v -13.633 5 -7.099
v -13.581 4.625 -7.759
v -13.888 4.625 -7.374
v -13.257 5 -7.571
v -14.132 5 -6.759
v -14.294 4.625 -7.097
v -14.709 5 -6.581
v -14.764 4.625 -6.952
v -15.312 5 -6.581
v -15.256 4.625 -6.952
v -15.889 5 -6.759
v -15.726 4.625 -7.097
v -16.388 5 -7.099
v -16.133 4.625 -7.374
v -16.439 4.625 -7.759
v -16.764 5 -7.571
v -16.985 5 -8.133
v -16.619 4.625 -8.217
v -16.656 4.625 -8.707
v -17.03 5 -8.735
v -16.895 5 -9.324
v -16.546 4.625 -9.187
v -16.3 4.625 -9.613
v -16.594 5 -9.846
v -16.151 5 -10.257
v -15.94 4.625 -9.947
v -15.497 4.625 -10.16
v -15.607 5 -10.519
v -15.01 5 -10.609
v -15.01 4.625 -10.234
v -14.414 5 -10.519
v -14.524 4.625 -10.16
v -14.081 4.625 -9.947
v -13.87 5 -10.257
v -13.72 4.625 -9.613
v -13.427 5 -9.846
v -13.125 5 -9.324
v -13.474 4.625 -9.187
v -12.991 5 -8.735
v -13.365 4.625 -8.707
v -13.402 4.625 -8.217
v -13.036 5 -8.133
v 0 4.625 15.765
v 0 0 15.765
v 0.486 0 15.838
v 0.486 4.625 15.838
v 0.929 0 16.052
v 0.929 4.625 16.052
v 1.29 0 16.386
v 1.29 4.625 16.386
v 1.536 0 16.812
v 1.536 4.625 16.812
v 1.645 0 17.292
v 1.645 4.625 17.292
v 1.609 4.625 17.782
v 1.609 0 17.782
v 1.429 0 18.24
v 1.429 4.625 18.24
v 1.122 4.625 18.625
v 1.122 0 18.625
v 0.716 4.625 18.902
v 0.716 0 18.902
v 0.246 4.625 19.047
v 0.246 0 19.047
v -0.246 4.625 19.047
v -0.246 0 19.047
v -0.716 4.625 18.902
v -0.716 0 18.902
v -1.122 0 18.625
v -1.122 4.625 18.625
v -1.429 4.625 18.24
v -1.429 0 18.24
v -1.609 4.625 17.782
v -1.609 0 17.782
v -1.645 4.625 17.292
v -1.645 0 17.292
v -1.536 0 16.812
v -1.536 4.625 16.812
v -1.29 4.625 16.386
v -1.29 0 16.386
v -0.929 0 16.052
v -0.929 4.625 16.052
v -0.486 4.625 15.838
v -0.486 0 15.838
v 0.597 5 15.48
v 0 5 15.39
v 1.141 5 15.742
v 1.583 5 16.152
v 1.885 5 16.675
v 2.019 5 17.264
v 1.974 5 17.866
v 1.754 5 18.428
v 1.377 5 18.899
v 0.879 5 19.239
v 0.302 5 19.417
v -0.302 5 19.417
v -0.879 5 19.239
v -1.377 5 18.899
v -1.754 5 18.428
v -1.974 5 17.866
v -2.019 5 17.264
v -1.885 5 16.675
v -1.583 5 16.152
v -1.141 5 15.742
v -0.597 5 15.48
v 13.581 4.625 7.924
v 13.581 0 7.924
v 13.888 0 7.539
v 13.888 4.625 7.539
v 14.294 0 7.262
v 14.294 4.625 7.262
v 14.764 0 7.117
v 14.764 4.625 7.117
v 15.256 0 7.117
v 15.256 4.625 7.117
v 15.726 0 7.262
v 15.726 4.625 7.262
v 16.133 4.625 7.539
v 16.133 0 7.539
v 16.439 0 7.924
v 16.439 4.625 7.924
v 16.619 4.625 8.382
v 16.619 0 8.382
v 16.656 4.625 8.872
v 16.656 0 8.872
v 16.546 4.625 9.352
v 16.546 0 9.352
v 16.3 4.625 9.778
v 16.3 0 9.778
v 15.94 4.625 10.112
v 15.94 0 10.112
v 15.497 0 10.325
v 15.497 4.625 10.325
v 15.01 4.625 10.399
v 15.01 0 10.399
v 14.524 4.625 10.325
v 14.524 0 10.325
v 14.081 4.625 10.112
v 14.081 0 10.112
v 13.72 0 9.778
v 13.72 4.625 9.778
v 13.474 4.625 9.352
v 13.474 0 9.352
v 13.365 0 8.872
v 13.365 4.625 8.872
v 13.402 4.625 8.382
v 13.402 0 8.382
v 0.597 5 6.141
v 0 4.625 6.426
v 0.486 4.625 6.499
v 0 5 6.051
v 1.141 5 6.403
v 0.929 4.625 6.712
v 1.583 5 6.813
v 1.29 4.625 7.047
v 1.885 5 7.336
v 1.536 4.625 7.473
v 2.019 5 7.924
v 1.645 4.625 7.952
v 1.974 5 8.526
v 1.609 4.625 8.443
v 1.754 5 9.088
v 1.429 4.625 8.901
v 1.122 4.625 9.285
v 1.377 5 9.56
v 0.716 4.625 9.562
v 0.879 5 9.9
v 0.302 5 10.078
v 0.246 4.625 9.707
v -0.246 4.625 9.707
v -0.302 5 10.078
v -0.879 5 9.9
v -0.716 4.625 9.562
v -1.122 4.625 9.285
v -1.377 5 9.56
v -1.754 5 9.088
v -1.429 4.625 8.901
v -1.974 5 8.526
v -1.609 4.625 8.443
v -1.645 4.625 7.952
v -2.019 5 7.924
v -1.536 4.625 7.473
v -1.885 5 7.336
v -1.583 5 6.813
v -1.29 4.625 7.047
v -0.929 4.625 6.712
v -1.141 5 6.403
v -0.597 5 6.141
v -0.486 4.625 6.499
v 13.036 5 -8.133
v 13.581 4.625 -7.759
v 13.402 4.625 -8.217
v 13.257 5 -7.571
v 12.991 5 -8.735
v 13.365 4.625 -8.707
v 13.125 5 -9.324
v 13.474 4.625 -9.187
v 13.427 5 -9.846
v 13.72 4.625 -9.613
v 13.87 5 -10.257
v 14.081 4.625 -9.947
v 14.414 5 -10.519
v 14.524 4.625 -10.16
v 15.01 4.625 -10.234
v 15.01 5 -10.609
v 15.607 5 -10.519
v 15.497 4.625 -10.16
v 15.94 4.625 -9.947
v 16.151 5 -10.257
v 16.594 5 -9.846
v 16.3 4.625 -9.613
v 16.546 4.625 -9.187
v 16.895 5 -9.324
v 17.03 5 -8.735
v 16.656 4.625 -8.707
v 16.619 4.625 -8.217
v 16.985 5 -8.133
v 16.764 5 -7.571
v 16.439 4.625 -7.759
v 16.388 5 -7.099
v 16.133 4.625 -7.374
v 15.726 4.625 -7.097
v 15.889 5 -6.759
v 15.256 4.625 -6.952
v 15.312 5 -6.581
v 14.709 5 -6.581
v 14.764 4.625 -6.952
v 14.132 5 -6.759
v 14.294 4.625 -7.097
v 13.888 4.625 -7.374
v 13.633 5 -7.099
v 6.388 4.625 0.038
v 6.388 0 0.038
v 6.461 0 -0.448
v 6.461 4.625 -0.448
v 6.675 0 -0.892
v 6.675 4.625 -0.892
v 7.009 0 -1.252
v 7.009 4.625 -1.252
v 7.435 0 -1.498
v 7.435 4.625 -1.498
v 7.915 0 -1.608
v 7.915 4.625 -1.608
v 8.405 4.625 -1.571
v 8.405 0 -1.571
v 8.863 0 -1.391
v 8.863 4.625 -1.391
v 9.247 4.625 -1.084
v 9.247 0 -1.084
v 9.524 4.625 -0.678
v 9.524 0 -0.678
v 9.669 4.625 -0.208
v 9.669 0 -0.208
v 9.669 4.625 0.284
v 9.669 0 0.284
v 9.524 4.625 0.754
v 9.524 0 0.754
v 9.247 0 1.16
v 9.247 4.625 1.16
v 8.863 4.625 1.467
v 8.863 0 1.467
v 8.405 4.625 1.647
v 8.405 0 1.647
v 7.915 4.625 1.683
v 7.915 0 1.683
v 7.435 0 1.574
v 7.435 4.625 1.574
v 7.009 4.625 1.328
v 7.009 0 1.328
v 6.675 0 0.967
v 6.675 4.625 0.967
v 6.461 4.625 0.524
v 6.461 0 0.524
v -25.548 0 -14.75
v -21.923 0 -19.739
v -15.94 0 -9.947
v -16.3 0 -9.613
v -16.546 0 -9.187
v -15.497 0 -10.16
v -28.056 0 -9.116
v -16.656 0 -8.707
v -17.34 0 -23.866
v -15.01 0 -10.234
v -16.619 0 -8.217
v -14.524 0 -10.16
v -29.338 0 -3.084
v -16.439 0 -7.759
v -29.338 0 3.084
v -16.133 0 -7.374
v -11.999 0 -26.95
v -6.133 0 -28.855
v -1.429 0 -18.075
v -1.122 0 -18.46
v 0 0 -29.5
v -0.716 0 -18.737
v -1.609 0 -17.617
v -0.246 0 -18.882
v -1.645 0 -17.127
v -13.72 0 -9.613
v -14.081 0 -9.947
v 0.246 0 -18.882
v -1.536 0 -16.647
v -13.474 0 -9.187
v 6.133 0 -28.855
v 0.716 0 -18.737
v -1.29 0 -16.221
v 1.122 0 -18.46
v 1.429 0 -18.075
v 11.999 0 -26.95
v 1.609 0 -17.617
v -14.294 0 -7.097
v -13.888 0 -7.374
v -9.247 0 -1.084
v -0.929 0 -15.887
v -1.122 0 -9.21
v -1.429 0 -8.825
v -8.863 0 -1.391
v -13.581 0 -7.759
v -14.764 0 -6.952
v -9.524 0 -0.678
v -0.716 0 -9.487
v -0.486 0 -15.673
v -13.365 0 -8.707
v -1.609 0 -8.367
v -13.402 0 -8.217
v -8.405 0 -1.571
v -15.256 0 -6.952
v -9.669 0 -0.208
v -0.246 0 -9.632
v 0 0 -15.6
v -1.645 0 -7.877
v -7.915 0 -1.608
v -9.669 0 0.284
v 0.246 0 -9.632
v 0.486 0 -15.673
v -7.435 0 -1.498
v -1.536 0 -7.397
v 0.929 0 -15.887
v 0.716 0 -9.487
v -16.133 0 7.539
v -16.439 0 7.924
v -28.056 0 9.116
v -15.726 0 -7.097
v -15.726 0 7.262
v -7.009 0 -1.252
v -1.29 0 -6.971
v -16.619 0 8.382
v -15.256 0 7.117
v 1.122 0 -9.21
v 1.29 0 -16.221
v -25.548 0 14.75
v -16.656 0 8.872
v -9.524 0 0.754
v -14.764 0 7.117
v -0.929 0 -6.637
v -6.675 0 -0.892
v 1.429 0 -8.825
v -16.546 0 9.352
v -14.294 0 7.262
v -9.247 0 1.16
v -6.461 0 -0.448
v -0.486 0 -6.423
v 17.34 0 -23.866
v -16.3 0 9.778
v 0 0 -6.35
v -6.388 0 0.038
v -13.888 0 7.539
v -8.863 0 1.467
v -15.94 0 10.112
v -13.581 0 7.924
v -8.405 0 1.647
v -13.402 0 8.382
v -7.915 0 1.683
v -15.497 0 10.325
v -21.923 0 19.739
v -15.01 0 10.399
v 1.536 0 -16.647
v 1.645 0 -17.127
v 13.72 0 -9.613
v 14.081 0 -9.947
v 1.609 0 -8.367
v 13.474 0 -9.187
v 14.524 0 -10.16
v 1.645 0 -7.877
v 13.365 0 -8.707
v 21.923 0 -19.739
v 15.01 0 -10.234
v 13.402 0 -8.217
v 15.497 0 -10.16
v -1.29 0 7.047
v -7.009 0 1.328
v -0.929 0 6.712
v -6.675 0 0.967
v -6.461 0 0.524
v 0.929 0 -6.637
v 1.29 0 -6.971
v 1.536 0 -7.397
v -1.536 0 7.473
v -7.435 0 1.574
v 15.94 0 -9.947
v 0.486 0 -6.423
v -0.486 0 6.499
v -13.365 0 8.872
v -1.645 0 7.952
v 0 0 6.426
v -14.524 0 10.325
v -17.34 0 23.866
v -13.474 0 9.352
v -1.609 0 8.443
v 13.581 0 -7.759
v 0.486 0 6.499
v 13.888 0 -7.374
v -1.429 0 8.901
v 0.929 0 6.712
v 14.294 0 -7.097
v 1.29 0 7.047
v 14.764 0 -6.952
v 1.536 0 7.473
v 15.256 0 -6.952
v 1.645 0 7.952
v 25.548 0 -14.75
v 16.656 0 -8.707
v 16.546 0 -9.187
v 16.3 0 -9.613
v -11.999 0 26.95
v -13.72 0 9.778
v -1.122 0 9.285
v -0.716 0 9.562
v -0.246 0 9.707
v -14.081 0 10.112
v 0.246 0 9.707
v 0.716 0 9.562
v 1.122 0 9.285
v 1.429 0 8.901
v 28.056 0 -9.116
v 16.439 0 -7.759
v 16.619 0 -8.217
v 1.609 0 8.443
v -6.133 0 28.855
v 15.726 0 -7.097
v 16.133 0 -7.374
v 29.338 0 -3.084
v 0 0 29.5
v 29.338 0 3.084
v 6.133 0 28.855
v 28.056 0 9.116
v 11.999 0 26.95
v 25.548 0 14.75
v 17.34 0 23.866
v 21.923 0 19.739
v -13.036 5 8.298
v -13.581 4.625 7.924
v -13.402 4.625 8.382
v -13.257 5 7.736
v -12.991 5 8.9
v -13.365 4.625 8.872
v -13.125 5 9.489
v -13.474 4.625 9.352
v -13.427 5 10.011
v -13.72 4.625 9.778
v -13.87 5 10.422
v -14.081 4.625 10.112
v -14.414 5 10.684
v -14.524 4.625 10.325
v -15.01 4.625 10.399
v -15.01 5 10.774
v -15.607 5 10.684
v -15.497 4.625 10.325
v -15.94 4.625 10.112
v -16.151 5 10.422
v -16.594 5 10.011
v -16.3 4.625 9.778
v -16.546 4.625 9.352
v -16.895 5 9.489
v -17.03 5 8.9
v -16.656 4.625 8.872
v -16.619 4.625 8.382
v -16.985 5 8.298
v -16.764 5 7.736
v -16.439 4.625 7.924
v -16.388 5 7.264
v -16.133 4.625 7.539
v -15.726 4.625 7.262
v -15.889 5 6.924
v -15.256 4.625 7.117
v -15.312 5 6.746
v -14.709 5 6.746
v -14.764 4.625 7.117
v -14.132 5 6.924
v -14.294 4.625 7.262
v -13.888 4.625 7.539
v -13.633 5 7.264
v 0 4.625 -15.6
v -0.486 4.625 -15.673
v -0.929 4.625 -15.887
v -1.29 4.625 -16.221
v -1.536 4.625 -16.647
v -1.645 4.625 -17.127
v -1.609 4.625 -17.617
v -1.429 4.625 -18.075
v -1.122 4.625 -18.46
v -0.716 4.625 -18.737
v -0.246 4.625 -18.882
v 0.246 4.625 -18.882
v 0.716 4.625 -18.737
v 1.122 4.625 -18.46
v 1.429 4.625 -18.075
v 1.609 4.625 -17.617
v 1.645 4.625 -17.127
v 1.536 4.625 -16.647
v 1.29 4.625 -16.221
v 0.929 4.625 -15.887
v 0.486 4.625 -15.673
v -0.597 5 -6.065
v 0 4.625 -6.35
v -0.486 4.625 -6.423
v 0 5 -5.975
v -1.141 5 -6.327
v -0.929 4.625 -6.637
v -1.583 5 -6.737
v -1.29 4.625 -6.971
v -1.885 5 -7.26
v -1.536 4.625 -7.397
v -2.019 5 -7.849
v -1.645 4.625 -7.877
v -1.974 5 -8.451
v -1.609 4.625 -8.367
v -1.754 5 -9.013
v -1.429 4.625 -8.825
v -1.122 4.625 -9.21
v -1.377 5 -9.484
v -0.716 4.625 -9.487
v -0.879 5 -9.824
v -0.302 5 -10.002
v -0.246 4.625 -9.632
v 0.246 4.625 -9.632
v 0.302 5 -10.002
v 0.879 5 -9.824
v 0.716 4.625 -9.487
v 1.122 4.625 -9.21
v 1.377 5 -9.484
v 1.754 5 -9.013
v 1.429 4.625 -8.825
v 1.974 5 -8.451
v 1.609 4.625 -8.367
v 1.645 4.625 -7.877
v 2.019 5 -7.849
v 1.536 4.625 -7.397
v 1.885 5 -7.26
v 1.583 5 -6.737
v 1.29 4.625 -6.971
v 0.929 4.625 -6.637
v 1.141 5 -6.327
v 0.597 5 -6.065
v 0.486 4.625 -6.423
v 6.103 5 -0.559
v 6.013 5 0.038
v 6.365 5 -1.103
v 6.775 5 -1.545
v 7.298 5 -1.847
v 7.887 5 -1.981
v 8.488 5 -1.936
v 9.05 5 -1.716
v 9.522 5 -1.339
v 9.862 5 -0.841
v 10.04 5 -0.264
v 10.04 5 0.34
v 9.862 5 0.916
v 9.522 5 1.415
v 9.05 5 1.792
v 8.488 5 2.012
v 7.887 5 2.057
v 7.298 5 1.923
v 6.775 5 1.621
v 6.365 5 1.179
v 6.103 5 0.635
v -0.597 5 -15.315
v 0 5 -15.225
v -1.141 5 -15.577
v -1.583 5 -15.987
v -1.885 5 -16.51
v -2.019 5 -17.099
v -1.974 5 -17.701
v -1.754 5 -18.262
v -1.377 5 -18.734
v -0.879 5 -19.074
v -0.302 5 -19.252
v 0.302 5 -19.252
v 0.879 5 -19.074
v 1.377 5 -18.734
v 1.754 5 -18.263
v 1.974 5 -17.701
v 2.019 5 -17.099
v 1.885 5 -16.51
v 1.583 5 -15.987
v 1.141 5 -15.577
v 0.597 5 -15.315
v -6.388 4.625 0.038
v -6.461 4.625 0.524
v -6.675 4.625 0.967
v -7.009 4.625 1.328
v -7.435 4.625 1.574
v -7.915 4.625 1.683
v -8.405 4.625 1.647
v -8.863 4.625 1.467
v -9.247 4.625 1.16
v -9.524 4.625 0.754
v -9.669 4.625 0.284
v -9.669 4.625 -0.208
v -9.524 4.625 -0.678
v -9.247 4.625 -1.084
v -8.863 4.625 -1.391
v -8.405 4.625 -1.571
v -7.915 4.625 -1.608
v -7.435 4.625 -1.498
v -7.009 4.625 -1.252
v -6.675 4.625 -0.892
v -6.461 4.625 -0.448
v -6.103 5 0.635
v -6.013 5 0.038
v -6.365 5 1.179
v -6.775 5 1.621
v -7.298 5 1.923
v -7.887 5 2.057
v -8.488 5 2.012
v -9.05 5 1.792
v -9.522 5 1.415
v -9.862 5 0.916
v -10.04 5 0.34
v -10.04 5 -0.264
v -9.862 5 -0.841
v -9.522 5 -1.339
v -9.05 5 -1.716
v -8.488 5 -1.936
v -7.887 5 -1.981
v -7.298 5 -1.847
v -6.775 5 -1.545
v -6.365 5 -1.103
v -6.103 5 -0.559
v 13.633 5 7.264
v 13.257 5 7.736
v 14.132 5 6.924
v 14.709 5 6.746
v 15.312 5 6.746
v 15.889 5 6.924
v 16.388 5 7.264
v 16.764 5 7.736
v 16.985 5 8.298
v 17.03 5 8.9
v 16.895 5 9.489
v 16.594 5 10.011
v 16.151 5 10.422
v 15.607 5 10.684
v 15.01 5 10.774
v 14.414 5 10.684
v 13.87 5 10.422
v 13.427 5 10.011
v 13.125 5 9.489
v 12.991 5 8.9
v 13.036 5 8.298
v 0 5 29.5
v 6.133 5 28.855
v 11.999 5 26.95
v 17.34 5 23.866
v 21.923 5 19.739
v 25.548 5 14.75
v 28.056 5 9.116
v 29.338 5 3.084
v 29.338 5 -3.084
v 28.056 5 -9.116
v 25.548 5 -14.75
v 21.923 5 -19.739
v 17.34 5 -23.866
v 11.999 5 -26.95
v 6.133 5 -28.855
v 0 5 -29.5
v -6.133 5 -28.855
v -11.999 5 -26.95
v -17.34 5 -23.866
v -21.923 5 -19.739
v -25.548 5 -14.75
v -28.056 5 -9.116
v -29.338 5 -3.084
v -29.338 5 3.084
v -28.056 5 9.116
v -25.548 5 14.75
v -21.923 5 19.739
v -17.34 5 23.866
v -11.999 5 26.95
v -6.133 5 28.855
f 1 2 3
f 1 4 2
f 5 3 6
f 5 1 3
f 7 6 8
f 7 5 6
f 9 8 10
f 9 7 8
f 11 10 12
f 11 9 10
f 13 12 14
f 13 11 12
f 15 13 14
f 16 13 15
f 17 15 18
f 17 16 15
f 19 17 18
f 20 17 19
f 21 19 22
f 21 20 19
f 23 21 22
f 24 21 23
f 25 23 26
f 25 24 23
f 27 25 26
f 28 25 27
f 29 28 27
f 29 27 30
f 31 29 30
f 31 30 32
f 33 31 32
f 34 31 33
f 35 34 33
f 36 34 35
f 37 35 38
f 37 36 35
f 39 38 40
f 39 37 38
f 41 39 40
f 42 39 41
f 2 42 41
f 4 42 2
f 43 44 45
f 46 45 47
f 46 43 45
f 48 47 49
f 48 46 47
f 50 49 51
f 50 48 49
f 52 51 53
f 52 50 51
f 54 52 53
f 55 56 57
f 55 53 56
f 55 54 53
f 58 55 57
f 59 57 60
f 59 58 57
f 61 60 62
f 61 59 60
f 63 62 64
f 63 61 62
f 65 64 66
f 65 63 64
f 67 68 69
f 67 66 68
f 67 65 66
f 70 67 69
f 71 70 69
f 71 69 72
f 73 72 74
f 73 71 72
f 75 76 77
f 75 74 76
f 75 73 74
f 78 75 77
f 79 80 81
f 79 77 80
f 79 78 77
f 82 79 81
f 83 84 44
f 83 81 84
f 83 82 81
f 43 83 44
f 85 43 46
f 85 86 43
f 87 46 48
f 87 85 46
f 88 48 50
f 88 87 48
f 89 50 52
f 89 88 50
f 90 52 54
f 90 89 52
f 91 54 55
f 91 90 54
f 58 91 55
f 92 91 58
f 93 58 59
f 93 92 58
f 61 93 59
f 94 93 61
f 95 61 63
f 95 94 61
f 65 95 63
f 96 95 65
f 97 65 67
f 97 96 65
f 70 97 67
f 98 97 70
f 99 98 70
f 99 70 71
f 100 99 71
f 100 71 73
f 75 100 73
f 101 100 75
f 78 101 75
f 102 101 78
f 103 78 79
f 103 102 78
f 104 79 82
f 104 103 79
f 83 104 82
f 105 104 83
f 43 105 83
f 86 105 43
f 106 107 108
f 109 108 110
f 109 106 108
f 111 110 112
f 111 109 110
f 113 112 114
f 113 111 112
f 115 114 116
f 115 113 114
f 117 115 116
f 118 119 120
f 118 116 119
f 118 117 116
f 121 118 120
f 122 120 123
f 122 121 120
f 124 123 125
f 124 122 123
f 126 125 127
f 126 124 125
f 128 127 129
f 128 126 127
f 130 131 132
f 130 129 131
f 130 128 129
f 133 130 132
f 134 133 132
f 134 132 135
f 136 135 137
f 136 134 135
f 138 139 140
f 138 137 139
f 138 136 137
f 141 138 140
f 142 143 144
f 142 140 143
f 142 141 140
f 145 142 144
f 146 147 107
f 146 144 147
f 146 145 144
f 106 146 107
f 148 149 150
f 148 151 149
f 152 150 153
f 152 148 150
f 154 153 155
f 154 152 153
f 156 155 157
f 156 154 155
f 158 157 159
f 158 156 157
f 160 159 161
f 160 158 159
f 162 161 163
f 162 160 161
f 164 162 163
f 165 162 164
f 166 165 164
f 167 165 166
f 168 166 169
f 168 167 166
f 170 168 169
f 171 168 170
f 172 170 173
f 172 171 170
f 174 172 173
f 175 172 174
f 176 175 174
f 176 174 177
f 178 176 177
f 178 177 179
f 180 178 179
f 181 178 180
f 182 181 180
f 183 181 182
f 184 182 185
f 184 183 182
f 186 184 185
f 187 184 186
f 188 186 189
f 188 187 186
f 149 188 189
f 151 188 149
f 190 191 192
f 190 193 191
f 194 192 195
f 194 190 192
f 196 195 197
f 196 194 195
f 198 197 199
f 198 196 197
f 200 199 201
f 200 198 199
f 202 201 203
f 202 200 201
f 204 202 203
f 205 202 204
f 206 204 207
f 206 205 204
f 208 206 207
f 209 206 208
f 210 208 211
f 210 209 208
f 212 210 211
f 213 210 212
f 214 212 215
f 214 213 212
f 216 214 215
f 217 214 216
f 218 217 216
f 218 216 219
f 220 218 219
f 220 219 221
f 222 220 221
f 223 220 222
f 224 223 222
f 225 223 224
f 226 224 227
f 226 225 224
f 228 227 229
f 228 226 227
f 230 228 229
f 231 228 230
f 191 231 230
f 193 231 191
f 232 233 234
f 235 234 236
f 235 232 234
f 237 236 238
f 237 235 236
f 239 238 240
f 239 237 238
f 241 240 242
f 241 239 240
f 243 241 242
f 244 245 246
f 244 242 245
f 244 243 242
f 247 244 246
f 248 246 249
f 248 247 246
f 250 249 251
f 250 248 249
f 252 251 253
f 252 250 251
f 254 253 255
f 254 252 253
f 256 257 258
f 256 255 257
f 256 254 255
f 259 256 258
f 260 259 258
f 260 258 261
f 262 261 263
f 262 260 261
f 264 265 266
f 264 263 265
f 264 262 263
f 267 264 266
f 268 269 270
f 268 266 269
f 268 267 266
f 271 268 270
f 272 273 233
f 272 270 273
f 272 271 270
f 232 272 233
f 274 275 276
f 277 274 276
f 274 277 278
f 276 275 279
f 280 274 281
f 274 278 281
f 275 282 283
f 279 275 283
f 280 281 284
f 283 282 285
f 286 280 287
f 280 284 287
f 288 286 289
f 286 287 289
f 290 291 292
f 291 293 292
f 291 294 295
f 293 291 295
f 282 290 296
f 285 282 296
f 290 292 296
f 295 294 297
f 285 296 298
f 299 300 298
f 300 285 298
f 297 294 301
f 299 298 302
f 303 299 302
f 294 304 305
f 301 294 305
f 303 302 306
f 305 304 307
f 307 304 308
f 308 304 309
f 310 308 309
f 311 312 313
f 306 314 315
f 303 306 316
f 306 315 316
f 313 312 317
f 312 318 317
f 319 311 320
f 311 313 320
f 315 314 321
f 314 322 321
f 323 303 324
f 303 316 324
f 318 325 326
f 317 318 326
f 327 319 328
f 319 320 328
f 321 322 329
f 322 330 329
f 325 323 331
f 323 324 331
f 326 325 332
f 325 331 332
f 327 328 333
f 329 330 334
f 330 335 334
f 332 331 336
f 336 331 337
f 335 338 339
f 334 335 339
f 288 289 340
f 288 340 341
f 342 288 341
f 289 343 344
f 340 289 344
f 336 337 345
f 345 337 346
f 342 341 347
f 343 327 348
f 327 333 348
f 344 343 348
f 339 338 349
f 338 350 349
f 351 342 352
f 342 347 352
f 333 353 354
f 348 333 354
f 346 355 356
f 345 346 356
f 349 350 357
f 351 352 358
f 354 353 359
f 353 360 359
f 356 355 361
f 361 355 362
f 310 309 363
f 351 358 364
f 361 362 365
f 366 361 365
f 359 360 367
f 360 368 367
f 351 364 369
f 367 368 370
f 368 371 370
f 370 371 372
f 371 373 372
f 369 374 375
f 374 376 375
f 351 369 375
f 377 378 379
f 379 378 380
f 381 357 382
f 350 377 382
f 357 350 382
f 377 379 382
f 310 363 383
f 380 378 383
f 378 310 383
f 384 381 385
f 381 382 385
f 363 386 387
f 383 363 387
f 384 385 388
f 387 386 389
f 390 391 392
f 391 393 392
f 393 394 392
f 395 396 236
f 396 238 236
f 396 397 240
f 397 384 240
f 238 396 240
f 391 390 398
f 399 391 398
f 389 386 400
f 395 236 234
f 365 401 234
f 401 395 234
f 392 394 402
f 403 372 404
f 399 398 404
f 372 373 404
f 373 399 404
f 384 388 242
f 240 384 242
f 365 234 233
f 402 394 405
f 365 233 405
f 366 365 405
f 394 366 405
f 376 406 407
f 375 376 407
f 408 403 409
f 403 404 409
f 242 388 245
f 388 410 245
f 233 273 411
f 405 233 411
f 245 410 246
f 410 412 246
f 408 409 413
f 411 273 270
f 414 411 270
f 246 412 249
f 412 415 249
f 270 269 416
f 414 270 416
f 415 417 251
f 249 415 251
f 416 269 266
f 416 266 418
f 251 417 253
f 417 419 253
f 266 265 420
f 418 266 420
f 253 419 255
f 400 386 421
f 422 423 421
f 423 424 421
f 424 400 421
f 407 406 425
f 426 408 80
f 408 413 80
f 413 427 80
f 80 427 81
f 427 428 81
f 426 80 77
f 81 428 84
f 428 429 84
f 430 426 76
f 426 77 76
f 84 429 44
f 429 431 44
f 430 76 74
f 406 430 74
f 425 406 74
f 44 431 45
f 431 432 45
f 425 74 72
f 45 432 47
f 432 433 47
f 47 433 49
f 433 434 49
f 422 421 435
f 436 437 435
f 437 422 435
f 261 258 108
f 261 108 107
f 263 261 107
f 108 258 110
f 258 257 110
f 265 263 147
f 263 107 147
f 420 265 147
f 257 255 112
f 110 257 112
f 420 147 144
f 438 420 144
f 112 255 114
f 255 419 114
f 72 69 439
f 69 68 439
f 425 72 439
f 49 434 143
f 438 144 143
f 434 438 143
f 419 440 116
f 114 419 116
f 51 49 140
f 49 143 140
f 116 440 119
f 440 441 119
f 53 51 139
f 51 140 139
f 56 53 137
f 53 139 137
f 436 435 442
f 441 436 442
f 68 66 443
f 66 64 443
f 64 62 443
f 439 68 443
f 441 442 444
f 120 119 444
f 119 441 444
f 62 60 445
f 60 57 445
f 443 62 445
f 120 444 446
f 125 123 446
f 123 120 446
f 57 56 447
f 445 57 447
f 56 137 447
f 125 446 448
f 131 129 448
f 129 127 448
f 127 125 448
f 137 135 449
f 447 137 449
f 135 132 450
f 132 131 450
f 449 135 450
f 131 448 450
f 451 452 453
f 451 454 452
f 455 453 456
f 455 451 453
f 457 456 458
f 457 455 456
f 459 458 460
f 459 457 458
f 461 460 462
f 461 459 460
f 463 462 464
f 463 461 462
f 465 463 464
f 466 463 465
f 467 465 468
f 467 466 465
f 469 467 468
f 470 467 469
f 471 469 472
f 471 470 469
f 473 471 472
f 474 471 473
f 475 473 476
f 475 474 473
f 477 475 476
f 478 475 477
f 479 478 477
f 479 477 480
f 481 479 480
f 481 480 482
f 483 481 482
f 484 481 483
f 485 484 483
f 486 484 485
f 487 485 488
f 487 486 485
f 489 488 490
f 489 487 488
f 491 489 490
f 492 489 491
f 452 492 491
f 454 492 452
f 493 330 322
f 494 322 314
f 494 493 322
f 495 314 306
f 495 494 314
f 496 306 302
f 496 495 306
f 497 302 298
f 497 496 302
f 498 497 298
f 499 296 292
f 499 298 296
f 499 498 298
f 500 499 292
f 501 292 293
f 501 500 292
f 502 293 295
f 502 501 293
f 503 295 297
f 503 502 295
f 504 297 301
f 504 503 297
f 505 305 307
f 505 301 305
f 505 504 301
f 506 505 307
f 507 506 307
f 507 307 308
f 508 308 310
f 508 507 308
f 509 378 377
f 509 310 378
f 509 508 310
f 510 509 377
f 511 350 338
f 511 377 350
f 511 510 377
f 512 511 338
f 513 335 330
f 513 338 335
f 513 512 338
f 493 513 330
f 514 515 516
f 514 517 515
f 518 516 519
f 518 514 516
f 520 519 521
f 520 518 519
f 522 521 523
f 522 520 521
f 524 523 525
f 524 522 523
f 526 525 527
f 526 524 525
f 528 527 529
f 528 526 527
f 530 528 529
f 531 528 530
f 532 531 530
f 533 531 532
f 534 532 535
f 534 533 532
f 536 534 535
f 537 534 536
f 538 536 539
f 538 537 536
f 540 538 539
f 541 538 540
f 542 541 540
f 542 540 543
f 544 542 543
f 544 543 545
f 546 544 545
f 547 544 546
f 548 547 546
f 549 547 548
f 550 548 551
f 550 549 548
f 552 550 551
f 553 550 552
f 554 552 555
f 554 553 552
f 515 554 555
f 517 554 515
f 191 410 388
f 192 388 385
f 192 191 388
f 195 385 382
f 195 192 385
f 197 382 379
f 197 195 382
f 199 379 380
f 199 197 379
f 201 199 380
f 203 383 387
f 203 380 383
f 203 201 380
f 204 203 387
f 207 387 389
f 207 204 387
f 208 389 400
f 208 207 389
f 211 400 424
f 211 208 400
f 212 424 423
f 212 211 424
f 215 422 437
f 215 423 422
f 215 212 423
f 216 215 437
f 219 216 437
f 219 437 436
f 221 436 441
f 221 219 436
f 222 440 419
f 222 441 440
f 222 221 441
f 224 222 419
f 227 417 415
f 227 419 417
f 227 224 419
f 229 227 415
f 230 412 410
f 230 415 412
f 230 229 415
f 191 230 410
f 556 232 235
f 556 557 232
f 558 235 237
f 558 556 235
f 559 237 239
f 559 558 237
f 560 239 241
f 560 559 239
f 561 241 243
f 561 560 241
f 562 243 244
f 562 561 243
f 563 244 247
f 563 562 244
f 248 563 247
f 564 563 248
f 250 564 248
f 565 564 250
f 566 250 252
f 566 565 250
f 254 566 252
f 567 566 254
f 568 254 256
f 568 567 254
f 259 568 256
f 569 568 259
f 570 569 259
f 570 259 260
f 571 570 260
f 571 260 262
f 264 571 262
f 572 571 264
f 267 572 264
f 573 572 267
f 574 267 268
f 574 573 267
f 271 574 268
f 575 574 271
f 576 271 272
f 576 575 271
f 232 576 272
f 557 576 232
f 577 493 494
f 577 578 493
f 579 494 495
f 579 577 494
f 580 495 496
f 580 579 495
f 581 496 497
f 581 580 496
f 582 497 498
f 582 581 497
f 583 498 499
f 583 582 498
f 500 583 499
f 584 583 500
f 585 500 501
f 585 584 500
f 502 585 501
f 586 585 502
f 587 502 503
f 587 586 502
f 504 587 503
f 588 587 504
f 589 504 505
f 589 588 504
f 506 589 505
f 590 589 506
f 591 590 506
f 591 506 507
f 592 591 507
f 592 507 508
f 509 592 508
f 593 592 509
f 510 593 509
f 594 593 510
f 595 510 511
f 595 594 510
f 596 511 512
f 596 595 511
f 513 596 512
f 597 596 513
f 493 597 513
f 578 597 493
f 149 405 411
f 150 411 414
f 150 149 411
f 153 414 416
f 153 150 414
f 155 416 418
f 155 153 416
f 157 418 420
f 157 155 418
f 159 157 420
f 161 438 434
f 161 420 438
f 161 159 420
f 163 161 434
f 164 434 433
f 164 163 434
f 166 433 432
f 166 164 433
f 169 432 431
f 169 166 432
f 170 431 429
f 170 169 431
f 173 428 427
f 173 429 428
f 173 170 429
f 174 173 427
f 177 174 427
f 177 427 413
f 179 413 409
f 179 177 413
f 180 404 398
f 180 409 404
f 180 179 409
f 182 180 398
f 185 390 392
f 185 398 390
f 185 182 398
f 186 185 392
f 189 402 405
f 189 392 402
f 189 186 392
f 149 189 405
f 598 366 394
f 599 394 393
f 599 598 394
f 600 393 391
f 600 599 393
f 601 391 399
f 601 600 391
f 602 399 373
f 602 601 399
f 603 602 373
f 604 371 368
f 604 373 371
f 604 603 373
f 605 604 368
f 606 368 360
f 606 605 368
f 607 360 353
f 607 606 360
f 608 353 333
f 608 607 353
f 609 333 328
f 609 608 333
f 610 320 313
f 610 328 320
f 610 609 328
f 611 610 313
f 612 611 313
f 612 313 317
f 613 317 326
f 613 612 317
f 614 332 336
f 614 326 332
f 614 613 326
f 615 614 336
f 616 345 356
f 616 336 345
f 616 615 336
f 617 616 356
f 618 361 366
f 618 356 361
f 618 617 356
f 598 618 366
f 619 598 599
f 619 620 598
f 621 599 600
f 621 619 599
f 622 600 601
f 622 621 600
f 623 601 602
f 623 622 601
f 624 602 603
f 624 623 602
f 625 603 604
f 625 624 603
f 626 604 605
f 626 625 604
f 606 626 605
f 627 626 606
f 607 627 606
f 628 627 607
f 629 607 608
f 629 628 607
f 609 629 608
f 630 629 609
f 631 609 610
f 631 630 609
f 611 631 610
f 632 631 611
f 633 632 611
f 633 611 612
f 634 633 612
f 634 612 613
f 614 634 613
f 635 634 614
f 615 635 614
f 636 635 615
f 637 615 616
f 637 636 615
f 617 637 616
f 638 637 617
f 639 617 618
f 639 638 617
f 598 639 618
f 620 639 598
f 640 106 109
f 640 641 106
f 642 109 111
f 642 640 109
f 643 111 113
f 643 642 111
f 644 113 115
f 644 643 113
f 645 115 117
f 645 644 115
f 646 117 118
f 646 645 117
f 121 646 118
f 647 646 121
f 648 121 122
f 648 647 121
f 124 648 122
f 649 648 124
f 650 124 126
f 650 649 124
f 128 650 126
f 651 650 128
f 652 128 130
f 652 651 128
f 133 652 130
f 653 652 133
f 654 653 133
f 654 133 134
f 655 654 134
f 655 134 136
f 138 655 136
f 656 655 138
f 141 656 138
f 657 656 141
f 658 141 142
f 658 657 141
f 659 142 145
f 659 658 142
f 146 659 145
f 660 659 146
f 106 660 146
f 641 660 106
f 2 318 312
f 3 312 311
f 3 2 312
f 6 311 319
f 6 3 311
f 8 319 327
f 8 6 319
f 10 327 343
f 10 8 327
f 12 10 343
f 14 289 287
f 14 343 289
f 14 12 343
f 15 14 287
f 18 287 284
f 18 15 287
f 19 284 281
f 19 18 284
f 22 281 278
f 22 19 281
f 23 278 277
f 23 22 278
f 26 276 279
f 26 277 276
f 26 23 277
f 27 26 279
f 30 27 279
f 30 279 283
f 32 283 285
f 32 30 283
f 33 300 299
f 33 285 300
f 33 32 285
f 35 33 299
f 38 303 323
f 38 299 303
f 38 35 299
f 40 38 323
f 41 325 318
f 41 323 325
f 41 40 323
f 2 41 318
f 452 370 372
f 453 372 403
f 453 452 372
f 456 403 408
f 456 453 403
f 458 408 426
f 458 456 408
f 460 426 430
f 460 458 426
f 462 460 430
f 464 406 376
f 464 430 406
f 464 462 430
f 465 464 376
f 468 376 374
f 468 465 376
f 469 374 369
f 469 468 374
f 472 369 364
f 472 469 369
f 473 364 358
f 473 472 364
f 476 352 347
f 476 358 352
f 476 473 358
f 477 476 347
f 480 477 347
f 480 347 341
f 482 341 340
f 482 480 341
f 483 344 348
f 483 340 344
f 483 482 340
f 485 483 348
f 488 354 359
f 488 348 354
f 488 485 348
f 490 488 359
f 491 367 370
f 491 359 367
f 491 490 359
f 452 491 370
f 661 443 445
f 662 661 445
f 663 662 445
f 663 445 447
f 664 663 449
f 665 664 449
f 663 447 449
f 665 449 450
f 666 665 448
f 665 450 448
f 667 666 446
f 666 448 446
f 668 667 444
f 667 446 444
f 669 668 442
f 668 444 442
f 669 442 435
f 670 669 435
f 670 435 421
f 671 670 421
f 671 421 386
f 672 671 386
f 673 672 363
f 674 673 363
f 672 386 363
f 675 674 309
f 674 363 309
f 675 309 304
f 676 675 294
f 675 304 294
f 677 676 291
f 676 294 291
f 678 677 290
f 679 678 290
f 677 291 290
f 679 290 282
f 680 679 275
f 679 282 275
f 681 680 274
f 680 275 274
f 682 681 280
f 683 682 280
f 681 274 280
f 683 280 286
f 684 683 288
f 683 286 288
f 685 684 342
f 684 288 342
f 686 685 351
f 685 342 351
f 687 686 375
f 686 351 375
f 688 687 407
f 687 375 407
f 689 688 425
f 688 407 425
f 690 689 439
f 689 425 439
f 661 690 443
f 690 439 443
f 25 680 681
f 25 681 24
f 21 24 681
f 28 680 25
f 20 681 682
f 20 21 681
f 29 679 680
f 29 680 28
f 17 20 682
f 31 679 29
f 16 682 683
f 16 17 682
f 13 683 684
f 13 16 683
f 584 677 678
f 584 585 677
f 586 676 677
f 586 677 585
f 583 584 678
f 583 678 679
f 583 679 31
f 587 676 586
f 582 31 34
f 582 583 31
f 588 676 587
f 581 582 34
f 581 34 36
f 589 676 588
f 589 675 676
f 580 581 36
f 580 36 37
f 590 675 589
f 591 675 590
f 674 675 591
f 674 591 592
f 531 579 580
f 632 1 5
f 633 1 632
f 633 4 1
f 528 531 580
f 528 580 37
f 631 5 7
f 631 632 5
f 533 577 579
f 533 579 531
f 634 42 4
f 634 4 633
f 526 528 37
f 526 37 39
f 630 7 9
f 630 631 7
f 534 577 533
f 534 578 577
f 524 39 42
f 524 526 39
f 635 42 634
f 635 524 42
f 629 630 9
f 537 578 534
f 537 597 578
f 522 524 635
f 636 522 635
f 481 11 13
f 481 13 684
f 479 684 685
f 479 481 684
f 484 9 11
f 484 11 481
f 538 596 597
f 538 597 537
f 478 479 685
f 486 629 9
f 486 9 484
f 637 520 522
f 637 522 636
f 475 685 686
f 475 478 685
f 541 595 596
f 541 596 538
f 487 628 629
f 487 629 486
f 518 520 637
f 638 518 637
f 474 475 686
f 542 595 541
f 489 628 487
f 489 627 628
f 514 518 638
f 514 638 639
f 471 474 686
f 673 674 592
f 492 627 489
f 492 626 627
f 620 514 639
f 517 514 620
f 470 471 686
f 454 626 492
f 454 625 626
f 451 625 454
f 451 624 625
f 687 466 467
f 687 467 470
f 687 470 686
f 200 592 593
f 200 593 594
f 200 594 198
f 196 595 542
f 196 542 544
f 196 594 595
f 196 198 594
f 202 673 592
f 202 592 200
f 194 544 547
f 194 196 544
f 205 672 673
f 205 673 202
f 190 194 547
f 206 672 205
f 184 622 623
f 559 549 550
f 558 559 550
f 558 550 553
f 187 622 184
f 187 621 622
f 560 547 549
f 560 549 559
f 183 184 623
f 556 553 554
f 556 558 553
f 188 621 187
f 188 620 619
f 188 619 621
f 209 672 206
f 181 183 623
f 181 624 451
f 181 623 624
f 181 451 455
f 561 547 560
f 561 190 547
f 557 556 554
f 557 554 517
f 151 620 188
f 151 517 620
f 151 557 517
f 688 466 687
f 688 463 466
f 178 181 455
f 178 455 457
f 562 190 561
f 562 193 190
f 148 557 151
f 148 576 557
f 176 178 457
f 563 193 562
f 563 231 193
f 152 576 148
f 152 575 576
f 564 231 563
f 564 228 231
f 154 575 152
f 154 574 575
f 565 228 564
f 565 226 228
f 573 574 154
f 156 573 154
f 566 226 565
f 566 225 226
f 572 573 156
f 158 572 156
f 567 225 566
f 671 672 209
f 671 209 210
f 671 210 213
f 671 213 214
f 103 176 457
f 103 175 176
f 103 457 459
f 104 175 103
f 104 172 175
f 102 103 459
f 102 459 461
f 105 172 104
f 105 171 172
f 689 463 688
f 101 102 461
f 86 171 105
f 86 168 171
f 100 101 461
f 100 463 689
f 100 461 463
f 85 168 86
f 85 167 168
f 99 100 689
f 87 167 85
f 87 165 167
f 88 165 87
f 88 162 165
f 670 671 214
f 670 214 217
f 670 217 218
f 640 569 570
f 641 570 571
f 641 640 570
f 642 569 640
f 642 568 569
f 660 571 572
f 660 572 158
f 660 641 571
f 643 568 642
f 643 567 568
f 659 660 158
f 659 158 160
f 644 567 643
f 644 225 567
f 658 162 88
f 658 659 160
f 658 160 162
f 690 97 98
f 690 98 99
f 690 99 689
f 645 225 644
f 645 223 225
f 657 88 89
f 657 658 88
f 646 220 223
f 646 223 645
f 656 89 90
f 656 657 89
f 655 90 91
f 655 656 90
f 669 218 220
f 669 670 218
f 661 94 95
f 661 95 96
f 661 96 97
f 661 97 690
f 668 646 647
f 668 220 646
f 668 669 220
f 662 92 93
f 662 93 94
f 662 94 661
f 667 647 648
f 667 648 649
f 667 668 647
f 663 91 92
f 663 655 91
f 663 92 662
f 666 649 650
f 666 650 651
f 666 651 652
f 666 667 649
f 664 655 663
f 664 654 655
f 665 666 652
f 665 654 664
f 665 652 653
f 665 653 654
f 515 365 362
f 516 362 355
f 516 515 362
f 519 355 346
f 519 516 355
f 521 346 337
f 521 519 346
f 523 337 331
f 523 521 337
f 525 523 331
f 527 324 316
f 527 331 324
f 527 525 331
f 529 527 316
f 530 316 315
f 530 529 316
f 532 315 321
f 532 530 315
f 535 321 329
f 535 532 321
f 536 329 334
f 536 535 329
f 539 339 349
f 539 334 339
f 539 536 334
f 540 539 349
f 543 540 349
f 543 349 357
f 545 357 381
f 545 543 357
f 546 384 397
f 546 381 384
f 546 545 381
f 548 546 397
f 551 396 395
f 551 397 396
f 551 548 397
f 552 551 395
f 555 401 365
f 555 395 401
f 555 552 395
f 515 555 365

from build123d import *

# Parameters (mm, degrees)
SKETCH_1_R               = 29.5
EXTRUDE_1_DEPTH          = 5
PATTERN_CIRCULAR_1_COUNT = 4
PATTERN_CIRCULAR_2_COUNT = 6


with BuildPart() as part:
    # 草图1 → 凸台-拉伸1 (new body)
    with BuildSketch(Plane(origin=(0, 0, 0), x_dir=(1, 0, 0), z_dir=(0, 1, 0))):
        with Locations(Location((0, 0, 0), (0, 0, 270))):
            Circle(SKETCH_1_R)
    extrude(amount=EXTRUDE_1_DEPTH)

    # 草图3 → M4 螺纹孔1 (revolve, cut)
    with BuildSketch(Plane(origin=(0, 5, -8), x_dir=(0, 0, 1), z_dir=(1, 0, 0))):
        Polygon((0, 0), (0, 11.091420021), (1.65, 10.1), (1.65, 0.375), (2.025, 0), align=None)
    hole_wizard_m4_1 = revolve(axis=Axis((0, 11.35, -8), (0, -1, 0)), mode=Mode.SUBTRACT)

    # 阵列(圆周)1: M4 螺纹孔1 ×4 about axis
    pattern_circular_1_axis = Axis((0, 0, 0.037874529), (0, 1, 0))
    for i in range(1, PATTERN_CIRCULAR_1_COUNT):
        add(hole_wizard_m4_1.rotate(pattern_circular_1_axis, i * 360 / PATTERN_CIRCULAR_1_COUNT), mode=Mode.SUBTRACT)

    # 草图5 → M4 螺纹孔2 (revolve, cut)
    with BuildSketch(Plane(origin=(0, 5, -17.25), x_dir=(0, 0, 1), z_dir=(1, 0, 0))):
        Polygon((0, 0), (0, 11.091420021), (1.65, 10.1), (1.65, 0.375), (2.025, 0), align=None)
    hole_wizard_m4_2 = revolve(axis=Axis((0, 11.35, -17.25), (0, -1, 0)), mode=Mode.SUBTRACT)

    # 阵列(圆周)2: M4 螺纹孔2 ×6 about axis
    pattern_circular_2_axis = Axis((0, 0, 0.082512271), (0, 1, 0))
    for i in range(1, PATTERN_CIRCULAR_2_COUNT):
        add(hole_wizard_m4_2.rotate(pattern_circular_2_axis, i * 360 / PATTERN_CIRCULAR_2_COUNT), mode=Mode.SUBTRACT)


solid = part.part
